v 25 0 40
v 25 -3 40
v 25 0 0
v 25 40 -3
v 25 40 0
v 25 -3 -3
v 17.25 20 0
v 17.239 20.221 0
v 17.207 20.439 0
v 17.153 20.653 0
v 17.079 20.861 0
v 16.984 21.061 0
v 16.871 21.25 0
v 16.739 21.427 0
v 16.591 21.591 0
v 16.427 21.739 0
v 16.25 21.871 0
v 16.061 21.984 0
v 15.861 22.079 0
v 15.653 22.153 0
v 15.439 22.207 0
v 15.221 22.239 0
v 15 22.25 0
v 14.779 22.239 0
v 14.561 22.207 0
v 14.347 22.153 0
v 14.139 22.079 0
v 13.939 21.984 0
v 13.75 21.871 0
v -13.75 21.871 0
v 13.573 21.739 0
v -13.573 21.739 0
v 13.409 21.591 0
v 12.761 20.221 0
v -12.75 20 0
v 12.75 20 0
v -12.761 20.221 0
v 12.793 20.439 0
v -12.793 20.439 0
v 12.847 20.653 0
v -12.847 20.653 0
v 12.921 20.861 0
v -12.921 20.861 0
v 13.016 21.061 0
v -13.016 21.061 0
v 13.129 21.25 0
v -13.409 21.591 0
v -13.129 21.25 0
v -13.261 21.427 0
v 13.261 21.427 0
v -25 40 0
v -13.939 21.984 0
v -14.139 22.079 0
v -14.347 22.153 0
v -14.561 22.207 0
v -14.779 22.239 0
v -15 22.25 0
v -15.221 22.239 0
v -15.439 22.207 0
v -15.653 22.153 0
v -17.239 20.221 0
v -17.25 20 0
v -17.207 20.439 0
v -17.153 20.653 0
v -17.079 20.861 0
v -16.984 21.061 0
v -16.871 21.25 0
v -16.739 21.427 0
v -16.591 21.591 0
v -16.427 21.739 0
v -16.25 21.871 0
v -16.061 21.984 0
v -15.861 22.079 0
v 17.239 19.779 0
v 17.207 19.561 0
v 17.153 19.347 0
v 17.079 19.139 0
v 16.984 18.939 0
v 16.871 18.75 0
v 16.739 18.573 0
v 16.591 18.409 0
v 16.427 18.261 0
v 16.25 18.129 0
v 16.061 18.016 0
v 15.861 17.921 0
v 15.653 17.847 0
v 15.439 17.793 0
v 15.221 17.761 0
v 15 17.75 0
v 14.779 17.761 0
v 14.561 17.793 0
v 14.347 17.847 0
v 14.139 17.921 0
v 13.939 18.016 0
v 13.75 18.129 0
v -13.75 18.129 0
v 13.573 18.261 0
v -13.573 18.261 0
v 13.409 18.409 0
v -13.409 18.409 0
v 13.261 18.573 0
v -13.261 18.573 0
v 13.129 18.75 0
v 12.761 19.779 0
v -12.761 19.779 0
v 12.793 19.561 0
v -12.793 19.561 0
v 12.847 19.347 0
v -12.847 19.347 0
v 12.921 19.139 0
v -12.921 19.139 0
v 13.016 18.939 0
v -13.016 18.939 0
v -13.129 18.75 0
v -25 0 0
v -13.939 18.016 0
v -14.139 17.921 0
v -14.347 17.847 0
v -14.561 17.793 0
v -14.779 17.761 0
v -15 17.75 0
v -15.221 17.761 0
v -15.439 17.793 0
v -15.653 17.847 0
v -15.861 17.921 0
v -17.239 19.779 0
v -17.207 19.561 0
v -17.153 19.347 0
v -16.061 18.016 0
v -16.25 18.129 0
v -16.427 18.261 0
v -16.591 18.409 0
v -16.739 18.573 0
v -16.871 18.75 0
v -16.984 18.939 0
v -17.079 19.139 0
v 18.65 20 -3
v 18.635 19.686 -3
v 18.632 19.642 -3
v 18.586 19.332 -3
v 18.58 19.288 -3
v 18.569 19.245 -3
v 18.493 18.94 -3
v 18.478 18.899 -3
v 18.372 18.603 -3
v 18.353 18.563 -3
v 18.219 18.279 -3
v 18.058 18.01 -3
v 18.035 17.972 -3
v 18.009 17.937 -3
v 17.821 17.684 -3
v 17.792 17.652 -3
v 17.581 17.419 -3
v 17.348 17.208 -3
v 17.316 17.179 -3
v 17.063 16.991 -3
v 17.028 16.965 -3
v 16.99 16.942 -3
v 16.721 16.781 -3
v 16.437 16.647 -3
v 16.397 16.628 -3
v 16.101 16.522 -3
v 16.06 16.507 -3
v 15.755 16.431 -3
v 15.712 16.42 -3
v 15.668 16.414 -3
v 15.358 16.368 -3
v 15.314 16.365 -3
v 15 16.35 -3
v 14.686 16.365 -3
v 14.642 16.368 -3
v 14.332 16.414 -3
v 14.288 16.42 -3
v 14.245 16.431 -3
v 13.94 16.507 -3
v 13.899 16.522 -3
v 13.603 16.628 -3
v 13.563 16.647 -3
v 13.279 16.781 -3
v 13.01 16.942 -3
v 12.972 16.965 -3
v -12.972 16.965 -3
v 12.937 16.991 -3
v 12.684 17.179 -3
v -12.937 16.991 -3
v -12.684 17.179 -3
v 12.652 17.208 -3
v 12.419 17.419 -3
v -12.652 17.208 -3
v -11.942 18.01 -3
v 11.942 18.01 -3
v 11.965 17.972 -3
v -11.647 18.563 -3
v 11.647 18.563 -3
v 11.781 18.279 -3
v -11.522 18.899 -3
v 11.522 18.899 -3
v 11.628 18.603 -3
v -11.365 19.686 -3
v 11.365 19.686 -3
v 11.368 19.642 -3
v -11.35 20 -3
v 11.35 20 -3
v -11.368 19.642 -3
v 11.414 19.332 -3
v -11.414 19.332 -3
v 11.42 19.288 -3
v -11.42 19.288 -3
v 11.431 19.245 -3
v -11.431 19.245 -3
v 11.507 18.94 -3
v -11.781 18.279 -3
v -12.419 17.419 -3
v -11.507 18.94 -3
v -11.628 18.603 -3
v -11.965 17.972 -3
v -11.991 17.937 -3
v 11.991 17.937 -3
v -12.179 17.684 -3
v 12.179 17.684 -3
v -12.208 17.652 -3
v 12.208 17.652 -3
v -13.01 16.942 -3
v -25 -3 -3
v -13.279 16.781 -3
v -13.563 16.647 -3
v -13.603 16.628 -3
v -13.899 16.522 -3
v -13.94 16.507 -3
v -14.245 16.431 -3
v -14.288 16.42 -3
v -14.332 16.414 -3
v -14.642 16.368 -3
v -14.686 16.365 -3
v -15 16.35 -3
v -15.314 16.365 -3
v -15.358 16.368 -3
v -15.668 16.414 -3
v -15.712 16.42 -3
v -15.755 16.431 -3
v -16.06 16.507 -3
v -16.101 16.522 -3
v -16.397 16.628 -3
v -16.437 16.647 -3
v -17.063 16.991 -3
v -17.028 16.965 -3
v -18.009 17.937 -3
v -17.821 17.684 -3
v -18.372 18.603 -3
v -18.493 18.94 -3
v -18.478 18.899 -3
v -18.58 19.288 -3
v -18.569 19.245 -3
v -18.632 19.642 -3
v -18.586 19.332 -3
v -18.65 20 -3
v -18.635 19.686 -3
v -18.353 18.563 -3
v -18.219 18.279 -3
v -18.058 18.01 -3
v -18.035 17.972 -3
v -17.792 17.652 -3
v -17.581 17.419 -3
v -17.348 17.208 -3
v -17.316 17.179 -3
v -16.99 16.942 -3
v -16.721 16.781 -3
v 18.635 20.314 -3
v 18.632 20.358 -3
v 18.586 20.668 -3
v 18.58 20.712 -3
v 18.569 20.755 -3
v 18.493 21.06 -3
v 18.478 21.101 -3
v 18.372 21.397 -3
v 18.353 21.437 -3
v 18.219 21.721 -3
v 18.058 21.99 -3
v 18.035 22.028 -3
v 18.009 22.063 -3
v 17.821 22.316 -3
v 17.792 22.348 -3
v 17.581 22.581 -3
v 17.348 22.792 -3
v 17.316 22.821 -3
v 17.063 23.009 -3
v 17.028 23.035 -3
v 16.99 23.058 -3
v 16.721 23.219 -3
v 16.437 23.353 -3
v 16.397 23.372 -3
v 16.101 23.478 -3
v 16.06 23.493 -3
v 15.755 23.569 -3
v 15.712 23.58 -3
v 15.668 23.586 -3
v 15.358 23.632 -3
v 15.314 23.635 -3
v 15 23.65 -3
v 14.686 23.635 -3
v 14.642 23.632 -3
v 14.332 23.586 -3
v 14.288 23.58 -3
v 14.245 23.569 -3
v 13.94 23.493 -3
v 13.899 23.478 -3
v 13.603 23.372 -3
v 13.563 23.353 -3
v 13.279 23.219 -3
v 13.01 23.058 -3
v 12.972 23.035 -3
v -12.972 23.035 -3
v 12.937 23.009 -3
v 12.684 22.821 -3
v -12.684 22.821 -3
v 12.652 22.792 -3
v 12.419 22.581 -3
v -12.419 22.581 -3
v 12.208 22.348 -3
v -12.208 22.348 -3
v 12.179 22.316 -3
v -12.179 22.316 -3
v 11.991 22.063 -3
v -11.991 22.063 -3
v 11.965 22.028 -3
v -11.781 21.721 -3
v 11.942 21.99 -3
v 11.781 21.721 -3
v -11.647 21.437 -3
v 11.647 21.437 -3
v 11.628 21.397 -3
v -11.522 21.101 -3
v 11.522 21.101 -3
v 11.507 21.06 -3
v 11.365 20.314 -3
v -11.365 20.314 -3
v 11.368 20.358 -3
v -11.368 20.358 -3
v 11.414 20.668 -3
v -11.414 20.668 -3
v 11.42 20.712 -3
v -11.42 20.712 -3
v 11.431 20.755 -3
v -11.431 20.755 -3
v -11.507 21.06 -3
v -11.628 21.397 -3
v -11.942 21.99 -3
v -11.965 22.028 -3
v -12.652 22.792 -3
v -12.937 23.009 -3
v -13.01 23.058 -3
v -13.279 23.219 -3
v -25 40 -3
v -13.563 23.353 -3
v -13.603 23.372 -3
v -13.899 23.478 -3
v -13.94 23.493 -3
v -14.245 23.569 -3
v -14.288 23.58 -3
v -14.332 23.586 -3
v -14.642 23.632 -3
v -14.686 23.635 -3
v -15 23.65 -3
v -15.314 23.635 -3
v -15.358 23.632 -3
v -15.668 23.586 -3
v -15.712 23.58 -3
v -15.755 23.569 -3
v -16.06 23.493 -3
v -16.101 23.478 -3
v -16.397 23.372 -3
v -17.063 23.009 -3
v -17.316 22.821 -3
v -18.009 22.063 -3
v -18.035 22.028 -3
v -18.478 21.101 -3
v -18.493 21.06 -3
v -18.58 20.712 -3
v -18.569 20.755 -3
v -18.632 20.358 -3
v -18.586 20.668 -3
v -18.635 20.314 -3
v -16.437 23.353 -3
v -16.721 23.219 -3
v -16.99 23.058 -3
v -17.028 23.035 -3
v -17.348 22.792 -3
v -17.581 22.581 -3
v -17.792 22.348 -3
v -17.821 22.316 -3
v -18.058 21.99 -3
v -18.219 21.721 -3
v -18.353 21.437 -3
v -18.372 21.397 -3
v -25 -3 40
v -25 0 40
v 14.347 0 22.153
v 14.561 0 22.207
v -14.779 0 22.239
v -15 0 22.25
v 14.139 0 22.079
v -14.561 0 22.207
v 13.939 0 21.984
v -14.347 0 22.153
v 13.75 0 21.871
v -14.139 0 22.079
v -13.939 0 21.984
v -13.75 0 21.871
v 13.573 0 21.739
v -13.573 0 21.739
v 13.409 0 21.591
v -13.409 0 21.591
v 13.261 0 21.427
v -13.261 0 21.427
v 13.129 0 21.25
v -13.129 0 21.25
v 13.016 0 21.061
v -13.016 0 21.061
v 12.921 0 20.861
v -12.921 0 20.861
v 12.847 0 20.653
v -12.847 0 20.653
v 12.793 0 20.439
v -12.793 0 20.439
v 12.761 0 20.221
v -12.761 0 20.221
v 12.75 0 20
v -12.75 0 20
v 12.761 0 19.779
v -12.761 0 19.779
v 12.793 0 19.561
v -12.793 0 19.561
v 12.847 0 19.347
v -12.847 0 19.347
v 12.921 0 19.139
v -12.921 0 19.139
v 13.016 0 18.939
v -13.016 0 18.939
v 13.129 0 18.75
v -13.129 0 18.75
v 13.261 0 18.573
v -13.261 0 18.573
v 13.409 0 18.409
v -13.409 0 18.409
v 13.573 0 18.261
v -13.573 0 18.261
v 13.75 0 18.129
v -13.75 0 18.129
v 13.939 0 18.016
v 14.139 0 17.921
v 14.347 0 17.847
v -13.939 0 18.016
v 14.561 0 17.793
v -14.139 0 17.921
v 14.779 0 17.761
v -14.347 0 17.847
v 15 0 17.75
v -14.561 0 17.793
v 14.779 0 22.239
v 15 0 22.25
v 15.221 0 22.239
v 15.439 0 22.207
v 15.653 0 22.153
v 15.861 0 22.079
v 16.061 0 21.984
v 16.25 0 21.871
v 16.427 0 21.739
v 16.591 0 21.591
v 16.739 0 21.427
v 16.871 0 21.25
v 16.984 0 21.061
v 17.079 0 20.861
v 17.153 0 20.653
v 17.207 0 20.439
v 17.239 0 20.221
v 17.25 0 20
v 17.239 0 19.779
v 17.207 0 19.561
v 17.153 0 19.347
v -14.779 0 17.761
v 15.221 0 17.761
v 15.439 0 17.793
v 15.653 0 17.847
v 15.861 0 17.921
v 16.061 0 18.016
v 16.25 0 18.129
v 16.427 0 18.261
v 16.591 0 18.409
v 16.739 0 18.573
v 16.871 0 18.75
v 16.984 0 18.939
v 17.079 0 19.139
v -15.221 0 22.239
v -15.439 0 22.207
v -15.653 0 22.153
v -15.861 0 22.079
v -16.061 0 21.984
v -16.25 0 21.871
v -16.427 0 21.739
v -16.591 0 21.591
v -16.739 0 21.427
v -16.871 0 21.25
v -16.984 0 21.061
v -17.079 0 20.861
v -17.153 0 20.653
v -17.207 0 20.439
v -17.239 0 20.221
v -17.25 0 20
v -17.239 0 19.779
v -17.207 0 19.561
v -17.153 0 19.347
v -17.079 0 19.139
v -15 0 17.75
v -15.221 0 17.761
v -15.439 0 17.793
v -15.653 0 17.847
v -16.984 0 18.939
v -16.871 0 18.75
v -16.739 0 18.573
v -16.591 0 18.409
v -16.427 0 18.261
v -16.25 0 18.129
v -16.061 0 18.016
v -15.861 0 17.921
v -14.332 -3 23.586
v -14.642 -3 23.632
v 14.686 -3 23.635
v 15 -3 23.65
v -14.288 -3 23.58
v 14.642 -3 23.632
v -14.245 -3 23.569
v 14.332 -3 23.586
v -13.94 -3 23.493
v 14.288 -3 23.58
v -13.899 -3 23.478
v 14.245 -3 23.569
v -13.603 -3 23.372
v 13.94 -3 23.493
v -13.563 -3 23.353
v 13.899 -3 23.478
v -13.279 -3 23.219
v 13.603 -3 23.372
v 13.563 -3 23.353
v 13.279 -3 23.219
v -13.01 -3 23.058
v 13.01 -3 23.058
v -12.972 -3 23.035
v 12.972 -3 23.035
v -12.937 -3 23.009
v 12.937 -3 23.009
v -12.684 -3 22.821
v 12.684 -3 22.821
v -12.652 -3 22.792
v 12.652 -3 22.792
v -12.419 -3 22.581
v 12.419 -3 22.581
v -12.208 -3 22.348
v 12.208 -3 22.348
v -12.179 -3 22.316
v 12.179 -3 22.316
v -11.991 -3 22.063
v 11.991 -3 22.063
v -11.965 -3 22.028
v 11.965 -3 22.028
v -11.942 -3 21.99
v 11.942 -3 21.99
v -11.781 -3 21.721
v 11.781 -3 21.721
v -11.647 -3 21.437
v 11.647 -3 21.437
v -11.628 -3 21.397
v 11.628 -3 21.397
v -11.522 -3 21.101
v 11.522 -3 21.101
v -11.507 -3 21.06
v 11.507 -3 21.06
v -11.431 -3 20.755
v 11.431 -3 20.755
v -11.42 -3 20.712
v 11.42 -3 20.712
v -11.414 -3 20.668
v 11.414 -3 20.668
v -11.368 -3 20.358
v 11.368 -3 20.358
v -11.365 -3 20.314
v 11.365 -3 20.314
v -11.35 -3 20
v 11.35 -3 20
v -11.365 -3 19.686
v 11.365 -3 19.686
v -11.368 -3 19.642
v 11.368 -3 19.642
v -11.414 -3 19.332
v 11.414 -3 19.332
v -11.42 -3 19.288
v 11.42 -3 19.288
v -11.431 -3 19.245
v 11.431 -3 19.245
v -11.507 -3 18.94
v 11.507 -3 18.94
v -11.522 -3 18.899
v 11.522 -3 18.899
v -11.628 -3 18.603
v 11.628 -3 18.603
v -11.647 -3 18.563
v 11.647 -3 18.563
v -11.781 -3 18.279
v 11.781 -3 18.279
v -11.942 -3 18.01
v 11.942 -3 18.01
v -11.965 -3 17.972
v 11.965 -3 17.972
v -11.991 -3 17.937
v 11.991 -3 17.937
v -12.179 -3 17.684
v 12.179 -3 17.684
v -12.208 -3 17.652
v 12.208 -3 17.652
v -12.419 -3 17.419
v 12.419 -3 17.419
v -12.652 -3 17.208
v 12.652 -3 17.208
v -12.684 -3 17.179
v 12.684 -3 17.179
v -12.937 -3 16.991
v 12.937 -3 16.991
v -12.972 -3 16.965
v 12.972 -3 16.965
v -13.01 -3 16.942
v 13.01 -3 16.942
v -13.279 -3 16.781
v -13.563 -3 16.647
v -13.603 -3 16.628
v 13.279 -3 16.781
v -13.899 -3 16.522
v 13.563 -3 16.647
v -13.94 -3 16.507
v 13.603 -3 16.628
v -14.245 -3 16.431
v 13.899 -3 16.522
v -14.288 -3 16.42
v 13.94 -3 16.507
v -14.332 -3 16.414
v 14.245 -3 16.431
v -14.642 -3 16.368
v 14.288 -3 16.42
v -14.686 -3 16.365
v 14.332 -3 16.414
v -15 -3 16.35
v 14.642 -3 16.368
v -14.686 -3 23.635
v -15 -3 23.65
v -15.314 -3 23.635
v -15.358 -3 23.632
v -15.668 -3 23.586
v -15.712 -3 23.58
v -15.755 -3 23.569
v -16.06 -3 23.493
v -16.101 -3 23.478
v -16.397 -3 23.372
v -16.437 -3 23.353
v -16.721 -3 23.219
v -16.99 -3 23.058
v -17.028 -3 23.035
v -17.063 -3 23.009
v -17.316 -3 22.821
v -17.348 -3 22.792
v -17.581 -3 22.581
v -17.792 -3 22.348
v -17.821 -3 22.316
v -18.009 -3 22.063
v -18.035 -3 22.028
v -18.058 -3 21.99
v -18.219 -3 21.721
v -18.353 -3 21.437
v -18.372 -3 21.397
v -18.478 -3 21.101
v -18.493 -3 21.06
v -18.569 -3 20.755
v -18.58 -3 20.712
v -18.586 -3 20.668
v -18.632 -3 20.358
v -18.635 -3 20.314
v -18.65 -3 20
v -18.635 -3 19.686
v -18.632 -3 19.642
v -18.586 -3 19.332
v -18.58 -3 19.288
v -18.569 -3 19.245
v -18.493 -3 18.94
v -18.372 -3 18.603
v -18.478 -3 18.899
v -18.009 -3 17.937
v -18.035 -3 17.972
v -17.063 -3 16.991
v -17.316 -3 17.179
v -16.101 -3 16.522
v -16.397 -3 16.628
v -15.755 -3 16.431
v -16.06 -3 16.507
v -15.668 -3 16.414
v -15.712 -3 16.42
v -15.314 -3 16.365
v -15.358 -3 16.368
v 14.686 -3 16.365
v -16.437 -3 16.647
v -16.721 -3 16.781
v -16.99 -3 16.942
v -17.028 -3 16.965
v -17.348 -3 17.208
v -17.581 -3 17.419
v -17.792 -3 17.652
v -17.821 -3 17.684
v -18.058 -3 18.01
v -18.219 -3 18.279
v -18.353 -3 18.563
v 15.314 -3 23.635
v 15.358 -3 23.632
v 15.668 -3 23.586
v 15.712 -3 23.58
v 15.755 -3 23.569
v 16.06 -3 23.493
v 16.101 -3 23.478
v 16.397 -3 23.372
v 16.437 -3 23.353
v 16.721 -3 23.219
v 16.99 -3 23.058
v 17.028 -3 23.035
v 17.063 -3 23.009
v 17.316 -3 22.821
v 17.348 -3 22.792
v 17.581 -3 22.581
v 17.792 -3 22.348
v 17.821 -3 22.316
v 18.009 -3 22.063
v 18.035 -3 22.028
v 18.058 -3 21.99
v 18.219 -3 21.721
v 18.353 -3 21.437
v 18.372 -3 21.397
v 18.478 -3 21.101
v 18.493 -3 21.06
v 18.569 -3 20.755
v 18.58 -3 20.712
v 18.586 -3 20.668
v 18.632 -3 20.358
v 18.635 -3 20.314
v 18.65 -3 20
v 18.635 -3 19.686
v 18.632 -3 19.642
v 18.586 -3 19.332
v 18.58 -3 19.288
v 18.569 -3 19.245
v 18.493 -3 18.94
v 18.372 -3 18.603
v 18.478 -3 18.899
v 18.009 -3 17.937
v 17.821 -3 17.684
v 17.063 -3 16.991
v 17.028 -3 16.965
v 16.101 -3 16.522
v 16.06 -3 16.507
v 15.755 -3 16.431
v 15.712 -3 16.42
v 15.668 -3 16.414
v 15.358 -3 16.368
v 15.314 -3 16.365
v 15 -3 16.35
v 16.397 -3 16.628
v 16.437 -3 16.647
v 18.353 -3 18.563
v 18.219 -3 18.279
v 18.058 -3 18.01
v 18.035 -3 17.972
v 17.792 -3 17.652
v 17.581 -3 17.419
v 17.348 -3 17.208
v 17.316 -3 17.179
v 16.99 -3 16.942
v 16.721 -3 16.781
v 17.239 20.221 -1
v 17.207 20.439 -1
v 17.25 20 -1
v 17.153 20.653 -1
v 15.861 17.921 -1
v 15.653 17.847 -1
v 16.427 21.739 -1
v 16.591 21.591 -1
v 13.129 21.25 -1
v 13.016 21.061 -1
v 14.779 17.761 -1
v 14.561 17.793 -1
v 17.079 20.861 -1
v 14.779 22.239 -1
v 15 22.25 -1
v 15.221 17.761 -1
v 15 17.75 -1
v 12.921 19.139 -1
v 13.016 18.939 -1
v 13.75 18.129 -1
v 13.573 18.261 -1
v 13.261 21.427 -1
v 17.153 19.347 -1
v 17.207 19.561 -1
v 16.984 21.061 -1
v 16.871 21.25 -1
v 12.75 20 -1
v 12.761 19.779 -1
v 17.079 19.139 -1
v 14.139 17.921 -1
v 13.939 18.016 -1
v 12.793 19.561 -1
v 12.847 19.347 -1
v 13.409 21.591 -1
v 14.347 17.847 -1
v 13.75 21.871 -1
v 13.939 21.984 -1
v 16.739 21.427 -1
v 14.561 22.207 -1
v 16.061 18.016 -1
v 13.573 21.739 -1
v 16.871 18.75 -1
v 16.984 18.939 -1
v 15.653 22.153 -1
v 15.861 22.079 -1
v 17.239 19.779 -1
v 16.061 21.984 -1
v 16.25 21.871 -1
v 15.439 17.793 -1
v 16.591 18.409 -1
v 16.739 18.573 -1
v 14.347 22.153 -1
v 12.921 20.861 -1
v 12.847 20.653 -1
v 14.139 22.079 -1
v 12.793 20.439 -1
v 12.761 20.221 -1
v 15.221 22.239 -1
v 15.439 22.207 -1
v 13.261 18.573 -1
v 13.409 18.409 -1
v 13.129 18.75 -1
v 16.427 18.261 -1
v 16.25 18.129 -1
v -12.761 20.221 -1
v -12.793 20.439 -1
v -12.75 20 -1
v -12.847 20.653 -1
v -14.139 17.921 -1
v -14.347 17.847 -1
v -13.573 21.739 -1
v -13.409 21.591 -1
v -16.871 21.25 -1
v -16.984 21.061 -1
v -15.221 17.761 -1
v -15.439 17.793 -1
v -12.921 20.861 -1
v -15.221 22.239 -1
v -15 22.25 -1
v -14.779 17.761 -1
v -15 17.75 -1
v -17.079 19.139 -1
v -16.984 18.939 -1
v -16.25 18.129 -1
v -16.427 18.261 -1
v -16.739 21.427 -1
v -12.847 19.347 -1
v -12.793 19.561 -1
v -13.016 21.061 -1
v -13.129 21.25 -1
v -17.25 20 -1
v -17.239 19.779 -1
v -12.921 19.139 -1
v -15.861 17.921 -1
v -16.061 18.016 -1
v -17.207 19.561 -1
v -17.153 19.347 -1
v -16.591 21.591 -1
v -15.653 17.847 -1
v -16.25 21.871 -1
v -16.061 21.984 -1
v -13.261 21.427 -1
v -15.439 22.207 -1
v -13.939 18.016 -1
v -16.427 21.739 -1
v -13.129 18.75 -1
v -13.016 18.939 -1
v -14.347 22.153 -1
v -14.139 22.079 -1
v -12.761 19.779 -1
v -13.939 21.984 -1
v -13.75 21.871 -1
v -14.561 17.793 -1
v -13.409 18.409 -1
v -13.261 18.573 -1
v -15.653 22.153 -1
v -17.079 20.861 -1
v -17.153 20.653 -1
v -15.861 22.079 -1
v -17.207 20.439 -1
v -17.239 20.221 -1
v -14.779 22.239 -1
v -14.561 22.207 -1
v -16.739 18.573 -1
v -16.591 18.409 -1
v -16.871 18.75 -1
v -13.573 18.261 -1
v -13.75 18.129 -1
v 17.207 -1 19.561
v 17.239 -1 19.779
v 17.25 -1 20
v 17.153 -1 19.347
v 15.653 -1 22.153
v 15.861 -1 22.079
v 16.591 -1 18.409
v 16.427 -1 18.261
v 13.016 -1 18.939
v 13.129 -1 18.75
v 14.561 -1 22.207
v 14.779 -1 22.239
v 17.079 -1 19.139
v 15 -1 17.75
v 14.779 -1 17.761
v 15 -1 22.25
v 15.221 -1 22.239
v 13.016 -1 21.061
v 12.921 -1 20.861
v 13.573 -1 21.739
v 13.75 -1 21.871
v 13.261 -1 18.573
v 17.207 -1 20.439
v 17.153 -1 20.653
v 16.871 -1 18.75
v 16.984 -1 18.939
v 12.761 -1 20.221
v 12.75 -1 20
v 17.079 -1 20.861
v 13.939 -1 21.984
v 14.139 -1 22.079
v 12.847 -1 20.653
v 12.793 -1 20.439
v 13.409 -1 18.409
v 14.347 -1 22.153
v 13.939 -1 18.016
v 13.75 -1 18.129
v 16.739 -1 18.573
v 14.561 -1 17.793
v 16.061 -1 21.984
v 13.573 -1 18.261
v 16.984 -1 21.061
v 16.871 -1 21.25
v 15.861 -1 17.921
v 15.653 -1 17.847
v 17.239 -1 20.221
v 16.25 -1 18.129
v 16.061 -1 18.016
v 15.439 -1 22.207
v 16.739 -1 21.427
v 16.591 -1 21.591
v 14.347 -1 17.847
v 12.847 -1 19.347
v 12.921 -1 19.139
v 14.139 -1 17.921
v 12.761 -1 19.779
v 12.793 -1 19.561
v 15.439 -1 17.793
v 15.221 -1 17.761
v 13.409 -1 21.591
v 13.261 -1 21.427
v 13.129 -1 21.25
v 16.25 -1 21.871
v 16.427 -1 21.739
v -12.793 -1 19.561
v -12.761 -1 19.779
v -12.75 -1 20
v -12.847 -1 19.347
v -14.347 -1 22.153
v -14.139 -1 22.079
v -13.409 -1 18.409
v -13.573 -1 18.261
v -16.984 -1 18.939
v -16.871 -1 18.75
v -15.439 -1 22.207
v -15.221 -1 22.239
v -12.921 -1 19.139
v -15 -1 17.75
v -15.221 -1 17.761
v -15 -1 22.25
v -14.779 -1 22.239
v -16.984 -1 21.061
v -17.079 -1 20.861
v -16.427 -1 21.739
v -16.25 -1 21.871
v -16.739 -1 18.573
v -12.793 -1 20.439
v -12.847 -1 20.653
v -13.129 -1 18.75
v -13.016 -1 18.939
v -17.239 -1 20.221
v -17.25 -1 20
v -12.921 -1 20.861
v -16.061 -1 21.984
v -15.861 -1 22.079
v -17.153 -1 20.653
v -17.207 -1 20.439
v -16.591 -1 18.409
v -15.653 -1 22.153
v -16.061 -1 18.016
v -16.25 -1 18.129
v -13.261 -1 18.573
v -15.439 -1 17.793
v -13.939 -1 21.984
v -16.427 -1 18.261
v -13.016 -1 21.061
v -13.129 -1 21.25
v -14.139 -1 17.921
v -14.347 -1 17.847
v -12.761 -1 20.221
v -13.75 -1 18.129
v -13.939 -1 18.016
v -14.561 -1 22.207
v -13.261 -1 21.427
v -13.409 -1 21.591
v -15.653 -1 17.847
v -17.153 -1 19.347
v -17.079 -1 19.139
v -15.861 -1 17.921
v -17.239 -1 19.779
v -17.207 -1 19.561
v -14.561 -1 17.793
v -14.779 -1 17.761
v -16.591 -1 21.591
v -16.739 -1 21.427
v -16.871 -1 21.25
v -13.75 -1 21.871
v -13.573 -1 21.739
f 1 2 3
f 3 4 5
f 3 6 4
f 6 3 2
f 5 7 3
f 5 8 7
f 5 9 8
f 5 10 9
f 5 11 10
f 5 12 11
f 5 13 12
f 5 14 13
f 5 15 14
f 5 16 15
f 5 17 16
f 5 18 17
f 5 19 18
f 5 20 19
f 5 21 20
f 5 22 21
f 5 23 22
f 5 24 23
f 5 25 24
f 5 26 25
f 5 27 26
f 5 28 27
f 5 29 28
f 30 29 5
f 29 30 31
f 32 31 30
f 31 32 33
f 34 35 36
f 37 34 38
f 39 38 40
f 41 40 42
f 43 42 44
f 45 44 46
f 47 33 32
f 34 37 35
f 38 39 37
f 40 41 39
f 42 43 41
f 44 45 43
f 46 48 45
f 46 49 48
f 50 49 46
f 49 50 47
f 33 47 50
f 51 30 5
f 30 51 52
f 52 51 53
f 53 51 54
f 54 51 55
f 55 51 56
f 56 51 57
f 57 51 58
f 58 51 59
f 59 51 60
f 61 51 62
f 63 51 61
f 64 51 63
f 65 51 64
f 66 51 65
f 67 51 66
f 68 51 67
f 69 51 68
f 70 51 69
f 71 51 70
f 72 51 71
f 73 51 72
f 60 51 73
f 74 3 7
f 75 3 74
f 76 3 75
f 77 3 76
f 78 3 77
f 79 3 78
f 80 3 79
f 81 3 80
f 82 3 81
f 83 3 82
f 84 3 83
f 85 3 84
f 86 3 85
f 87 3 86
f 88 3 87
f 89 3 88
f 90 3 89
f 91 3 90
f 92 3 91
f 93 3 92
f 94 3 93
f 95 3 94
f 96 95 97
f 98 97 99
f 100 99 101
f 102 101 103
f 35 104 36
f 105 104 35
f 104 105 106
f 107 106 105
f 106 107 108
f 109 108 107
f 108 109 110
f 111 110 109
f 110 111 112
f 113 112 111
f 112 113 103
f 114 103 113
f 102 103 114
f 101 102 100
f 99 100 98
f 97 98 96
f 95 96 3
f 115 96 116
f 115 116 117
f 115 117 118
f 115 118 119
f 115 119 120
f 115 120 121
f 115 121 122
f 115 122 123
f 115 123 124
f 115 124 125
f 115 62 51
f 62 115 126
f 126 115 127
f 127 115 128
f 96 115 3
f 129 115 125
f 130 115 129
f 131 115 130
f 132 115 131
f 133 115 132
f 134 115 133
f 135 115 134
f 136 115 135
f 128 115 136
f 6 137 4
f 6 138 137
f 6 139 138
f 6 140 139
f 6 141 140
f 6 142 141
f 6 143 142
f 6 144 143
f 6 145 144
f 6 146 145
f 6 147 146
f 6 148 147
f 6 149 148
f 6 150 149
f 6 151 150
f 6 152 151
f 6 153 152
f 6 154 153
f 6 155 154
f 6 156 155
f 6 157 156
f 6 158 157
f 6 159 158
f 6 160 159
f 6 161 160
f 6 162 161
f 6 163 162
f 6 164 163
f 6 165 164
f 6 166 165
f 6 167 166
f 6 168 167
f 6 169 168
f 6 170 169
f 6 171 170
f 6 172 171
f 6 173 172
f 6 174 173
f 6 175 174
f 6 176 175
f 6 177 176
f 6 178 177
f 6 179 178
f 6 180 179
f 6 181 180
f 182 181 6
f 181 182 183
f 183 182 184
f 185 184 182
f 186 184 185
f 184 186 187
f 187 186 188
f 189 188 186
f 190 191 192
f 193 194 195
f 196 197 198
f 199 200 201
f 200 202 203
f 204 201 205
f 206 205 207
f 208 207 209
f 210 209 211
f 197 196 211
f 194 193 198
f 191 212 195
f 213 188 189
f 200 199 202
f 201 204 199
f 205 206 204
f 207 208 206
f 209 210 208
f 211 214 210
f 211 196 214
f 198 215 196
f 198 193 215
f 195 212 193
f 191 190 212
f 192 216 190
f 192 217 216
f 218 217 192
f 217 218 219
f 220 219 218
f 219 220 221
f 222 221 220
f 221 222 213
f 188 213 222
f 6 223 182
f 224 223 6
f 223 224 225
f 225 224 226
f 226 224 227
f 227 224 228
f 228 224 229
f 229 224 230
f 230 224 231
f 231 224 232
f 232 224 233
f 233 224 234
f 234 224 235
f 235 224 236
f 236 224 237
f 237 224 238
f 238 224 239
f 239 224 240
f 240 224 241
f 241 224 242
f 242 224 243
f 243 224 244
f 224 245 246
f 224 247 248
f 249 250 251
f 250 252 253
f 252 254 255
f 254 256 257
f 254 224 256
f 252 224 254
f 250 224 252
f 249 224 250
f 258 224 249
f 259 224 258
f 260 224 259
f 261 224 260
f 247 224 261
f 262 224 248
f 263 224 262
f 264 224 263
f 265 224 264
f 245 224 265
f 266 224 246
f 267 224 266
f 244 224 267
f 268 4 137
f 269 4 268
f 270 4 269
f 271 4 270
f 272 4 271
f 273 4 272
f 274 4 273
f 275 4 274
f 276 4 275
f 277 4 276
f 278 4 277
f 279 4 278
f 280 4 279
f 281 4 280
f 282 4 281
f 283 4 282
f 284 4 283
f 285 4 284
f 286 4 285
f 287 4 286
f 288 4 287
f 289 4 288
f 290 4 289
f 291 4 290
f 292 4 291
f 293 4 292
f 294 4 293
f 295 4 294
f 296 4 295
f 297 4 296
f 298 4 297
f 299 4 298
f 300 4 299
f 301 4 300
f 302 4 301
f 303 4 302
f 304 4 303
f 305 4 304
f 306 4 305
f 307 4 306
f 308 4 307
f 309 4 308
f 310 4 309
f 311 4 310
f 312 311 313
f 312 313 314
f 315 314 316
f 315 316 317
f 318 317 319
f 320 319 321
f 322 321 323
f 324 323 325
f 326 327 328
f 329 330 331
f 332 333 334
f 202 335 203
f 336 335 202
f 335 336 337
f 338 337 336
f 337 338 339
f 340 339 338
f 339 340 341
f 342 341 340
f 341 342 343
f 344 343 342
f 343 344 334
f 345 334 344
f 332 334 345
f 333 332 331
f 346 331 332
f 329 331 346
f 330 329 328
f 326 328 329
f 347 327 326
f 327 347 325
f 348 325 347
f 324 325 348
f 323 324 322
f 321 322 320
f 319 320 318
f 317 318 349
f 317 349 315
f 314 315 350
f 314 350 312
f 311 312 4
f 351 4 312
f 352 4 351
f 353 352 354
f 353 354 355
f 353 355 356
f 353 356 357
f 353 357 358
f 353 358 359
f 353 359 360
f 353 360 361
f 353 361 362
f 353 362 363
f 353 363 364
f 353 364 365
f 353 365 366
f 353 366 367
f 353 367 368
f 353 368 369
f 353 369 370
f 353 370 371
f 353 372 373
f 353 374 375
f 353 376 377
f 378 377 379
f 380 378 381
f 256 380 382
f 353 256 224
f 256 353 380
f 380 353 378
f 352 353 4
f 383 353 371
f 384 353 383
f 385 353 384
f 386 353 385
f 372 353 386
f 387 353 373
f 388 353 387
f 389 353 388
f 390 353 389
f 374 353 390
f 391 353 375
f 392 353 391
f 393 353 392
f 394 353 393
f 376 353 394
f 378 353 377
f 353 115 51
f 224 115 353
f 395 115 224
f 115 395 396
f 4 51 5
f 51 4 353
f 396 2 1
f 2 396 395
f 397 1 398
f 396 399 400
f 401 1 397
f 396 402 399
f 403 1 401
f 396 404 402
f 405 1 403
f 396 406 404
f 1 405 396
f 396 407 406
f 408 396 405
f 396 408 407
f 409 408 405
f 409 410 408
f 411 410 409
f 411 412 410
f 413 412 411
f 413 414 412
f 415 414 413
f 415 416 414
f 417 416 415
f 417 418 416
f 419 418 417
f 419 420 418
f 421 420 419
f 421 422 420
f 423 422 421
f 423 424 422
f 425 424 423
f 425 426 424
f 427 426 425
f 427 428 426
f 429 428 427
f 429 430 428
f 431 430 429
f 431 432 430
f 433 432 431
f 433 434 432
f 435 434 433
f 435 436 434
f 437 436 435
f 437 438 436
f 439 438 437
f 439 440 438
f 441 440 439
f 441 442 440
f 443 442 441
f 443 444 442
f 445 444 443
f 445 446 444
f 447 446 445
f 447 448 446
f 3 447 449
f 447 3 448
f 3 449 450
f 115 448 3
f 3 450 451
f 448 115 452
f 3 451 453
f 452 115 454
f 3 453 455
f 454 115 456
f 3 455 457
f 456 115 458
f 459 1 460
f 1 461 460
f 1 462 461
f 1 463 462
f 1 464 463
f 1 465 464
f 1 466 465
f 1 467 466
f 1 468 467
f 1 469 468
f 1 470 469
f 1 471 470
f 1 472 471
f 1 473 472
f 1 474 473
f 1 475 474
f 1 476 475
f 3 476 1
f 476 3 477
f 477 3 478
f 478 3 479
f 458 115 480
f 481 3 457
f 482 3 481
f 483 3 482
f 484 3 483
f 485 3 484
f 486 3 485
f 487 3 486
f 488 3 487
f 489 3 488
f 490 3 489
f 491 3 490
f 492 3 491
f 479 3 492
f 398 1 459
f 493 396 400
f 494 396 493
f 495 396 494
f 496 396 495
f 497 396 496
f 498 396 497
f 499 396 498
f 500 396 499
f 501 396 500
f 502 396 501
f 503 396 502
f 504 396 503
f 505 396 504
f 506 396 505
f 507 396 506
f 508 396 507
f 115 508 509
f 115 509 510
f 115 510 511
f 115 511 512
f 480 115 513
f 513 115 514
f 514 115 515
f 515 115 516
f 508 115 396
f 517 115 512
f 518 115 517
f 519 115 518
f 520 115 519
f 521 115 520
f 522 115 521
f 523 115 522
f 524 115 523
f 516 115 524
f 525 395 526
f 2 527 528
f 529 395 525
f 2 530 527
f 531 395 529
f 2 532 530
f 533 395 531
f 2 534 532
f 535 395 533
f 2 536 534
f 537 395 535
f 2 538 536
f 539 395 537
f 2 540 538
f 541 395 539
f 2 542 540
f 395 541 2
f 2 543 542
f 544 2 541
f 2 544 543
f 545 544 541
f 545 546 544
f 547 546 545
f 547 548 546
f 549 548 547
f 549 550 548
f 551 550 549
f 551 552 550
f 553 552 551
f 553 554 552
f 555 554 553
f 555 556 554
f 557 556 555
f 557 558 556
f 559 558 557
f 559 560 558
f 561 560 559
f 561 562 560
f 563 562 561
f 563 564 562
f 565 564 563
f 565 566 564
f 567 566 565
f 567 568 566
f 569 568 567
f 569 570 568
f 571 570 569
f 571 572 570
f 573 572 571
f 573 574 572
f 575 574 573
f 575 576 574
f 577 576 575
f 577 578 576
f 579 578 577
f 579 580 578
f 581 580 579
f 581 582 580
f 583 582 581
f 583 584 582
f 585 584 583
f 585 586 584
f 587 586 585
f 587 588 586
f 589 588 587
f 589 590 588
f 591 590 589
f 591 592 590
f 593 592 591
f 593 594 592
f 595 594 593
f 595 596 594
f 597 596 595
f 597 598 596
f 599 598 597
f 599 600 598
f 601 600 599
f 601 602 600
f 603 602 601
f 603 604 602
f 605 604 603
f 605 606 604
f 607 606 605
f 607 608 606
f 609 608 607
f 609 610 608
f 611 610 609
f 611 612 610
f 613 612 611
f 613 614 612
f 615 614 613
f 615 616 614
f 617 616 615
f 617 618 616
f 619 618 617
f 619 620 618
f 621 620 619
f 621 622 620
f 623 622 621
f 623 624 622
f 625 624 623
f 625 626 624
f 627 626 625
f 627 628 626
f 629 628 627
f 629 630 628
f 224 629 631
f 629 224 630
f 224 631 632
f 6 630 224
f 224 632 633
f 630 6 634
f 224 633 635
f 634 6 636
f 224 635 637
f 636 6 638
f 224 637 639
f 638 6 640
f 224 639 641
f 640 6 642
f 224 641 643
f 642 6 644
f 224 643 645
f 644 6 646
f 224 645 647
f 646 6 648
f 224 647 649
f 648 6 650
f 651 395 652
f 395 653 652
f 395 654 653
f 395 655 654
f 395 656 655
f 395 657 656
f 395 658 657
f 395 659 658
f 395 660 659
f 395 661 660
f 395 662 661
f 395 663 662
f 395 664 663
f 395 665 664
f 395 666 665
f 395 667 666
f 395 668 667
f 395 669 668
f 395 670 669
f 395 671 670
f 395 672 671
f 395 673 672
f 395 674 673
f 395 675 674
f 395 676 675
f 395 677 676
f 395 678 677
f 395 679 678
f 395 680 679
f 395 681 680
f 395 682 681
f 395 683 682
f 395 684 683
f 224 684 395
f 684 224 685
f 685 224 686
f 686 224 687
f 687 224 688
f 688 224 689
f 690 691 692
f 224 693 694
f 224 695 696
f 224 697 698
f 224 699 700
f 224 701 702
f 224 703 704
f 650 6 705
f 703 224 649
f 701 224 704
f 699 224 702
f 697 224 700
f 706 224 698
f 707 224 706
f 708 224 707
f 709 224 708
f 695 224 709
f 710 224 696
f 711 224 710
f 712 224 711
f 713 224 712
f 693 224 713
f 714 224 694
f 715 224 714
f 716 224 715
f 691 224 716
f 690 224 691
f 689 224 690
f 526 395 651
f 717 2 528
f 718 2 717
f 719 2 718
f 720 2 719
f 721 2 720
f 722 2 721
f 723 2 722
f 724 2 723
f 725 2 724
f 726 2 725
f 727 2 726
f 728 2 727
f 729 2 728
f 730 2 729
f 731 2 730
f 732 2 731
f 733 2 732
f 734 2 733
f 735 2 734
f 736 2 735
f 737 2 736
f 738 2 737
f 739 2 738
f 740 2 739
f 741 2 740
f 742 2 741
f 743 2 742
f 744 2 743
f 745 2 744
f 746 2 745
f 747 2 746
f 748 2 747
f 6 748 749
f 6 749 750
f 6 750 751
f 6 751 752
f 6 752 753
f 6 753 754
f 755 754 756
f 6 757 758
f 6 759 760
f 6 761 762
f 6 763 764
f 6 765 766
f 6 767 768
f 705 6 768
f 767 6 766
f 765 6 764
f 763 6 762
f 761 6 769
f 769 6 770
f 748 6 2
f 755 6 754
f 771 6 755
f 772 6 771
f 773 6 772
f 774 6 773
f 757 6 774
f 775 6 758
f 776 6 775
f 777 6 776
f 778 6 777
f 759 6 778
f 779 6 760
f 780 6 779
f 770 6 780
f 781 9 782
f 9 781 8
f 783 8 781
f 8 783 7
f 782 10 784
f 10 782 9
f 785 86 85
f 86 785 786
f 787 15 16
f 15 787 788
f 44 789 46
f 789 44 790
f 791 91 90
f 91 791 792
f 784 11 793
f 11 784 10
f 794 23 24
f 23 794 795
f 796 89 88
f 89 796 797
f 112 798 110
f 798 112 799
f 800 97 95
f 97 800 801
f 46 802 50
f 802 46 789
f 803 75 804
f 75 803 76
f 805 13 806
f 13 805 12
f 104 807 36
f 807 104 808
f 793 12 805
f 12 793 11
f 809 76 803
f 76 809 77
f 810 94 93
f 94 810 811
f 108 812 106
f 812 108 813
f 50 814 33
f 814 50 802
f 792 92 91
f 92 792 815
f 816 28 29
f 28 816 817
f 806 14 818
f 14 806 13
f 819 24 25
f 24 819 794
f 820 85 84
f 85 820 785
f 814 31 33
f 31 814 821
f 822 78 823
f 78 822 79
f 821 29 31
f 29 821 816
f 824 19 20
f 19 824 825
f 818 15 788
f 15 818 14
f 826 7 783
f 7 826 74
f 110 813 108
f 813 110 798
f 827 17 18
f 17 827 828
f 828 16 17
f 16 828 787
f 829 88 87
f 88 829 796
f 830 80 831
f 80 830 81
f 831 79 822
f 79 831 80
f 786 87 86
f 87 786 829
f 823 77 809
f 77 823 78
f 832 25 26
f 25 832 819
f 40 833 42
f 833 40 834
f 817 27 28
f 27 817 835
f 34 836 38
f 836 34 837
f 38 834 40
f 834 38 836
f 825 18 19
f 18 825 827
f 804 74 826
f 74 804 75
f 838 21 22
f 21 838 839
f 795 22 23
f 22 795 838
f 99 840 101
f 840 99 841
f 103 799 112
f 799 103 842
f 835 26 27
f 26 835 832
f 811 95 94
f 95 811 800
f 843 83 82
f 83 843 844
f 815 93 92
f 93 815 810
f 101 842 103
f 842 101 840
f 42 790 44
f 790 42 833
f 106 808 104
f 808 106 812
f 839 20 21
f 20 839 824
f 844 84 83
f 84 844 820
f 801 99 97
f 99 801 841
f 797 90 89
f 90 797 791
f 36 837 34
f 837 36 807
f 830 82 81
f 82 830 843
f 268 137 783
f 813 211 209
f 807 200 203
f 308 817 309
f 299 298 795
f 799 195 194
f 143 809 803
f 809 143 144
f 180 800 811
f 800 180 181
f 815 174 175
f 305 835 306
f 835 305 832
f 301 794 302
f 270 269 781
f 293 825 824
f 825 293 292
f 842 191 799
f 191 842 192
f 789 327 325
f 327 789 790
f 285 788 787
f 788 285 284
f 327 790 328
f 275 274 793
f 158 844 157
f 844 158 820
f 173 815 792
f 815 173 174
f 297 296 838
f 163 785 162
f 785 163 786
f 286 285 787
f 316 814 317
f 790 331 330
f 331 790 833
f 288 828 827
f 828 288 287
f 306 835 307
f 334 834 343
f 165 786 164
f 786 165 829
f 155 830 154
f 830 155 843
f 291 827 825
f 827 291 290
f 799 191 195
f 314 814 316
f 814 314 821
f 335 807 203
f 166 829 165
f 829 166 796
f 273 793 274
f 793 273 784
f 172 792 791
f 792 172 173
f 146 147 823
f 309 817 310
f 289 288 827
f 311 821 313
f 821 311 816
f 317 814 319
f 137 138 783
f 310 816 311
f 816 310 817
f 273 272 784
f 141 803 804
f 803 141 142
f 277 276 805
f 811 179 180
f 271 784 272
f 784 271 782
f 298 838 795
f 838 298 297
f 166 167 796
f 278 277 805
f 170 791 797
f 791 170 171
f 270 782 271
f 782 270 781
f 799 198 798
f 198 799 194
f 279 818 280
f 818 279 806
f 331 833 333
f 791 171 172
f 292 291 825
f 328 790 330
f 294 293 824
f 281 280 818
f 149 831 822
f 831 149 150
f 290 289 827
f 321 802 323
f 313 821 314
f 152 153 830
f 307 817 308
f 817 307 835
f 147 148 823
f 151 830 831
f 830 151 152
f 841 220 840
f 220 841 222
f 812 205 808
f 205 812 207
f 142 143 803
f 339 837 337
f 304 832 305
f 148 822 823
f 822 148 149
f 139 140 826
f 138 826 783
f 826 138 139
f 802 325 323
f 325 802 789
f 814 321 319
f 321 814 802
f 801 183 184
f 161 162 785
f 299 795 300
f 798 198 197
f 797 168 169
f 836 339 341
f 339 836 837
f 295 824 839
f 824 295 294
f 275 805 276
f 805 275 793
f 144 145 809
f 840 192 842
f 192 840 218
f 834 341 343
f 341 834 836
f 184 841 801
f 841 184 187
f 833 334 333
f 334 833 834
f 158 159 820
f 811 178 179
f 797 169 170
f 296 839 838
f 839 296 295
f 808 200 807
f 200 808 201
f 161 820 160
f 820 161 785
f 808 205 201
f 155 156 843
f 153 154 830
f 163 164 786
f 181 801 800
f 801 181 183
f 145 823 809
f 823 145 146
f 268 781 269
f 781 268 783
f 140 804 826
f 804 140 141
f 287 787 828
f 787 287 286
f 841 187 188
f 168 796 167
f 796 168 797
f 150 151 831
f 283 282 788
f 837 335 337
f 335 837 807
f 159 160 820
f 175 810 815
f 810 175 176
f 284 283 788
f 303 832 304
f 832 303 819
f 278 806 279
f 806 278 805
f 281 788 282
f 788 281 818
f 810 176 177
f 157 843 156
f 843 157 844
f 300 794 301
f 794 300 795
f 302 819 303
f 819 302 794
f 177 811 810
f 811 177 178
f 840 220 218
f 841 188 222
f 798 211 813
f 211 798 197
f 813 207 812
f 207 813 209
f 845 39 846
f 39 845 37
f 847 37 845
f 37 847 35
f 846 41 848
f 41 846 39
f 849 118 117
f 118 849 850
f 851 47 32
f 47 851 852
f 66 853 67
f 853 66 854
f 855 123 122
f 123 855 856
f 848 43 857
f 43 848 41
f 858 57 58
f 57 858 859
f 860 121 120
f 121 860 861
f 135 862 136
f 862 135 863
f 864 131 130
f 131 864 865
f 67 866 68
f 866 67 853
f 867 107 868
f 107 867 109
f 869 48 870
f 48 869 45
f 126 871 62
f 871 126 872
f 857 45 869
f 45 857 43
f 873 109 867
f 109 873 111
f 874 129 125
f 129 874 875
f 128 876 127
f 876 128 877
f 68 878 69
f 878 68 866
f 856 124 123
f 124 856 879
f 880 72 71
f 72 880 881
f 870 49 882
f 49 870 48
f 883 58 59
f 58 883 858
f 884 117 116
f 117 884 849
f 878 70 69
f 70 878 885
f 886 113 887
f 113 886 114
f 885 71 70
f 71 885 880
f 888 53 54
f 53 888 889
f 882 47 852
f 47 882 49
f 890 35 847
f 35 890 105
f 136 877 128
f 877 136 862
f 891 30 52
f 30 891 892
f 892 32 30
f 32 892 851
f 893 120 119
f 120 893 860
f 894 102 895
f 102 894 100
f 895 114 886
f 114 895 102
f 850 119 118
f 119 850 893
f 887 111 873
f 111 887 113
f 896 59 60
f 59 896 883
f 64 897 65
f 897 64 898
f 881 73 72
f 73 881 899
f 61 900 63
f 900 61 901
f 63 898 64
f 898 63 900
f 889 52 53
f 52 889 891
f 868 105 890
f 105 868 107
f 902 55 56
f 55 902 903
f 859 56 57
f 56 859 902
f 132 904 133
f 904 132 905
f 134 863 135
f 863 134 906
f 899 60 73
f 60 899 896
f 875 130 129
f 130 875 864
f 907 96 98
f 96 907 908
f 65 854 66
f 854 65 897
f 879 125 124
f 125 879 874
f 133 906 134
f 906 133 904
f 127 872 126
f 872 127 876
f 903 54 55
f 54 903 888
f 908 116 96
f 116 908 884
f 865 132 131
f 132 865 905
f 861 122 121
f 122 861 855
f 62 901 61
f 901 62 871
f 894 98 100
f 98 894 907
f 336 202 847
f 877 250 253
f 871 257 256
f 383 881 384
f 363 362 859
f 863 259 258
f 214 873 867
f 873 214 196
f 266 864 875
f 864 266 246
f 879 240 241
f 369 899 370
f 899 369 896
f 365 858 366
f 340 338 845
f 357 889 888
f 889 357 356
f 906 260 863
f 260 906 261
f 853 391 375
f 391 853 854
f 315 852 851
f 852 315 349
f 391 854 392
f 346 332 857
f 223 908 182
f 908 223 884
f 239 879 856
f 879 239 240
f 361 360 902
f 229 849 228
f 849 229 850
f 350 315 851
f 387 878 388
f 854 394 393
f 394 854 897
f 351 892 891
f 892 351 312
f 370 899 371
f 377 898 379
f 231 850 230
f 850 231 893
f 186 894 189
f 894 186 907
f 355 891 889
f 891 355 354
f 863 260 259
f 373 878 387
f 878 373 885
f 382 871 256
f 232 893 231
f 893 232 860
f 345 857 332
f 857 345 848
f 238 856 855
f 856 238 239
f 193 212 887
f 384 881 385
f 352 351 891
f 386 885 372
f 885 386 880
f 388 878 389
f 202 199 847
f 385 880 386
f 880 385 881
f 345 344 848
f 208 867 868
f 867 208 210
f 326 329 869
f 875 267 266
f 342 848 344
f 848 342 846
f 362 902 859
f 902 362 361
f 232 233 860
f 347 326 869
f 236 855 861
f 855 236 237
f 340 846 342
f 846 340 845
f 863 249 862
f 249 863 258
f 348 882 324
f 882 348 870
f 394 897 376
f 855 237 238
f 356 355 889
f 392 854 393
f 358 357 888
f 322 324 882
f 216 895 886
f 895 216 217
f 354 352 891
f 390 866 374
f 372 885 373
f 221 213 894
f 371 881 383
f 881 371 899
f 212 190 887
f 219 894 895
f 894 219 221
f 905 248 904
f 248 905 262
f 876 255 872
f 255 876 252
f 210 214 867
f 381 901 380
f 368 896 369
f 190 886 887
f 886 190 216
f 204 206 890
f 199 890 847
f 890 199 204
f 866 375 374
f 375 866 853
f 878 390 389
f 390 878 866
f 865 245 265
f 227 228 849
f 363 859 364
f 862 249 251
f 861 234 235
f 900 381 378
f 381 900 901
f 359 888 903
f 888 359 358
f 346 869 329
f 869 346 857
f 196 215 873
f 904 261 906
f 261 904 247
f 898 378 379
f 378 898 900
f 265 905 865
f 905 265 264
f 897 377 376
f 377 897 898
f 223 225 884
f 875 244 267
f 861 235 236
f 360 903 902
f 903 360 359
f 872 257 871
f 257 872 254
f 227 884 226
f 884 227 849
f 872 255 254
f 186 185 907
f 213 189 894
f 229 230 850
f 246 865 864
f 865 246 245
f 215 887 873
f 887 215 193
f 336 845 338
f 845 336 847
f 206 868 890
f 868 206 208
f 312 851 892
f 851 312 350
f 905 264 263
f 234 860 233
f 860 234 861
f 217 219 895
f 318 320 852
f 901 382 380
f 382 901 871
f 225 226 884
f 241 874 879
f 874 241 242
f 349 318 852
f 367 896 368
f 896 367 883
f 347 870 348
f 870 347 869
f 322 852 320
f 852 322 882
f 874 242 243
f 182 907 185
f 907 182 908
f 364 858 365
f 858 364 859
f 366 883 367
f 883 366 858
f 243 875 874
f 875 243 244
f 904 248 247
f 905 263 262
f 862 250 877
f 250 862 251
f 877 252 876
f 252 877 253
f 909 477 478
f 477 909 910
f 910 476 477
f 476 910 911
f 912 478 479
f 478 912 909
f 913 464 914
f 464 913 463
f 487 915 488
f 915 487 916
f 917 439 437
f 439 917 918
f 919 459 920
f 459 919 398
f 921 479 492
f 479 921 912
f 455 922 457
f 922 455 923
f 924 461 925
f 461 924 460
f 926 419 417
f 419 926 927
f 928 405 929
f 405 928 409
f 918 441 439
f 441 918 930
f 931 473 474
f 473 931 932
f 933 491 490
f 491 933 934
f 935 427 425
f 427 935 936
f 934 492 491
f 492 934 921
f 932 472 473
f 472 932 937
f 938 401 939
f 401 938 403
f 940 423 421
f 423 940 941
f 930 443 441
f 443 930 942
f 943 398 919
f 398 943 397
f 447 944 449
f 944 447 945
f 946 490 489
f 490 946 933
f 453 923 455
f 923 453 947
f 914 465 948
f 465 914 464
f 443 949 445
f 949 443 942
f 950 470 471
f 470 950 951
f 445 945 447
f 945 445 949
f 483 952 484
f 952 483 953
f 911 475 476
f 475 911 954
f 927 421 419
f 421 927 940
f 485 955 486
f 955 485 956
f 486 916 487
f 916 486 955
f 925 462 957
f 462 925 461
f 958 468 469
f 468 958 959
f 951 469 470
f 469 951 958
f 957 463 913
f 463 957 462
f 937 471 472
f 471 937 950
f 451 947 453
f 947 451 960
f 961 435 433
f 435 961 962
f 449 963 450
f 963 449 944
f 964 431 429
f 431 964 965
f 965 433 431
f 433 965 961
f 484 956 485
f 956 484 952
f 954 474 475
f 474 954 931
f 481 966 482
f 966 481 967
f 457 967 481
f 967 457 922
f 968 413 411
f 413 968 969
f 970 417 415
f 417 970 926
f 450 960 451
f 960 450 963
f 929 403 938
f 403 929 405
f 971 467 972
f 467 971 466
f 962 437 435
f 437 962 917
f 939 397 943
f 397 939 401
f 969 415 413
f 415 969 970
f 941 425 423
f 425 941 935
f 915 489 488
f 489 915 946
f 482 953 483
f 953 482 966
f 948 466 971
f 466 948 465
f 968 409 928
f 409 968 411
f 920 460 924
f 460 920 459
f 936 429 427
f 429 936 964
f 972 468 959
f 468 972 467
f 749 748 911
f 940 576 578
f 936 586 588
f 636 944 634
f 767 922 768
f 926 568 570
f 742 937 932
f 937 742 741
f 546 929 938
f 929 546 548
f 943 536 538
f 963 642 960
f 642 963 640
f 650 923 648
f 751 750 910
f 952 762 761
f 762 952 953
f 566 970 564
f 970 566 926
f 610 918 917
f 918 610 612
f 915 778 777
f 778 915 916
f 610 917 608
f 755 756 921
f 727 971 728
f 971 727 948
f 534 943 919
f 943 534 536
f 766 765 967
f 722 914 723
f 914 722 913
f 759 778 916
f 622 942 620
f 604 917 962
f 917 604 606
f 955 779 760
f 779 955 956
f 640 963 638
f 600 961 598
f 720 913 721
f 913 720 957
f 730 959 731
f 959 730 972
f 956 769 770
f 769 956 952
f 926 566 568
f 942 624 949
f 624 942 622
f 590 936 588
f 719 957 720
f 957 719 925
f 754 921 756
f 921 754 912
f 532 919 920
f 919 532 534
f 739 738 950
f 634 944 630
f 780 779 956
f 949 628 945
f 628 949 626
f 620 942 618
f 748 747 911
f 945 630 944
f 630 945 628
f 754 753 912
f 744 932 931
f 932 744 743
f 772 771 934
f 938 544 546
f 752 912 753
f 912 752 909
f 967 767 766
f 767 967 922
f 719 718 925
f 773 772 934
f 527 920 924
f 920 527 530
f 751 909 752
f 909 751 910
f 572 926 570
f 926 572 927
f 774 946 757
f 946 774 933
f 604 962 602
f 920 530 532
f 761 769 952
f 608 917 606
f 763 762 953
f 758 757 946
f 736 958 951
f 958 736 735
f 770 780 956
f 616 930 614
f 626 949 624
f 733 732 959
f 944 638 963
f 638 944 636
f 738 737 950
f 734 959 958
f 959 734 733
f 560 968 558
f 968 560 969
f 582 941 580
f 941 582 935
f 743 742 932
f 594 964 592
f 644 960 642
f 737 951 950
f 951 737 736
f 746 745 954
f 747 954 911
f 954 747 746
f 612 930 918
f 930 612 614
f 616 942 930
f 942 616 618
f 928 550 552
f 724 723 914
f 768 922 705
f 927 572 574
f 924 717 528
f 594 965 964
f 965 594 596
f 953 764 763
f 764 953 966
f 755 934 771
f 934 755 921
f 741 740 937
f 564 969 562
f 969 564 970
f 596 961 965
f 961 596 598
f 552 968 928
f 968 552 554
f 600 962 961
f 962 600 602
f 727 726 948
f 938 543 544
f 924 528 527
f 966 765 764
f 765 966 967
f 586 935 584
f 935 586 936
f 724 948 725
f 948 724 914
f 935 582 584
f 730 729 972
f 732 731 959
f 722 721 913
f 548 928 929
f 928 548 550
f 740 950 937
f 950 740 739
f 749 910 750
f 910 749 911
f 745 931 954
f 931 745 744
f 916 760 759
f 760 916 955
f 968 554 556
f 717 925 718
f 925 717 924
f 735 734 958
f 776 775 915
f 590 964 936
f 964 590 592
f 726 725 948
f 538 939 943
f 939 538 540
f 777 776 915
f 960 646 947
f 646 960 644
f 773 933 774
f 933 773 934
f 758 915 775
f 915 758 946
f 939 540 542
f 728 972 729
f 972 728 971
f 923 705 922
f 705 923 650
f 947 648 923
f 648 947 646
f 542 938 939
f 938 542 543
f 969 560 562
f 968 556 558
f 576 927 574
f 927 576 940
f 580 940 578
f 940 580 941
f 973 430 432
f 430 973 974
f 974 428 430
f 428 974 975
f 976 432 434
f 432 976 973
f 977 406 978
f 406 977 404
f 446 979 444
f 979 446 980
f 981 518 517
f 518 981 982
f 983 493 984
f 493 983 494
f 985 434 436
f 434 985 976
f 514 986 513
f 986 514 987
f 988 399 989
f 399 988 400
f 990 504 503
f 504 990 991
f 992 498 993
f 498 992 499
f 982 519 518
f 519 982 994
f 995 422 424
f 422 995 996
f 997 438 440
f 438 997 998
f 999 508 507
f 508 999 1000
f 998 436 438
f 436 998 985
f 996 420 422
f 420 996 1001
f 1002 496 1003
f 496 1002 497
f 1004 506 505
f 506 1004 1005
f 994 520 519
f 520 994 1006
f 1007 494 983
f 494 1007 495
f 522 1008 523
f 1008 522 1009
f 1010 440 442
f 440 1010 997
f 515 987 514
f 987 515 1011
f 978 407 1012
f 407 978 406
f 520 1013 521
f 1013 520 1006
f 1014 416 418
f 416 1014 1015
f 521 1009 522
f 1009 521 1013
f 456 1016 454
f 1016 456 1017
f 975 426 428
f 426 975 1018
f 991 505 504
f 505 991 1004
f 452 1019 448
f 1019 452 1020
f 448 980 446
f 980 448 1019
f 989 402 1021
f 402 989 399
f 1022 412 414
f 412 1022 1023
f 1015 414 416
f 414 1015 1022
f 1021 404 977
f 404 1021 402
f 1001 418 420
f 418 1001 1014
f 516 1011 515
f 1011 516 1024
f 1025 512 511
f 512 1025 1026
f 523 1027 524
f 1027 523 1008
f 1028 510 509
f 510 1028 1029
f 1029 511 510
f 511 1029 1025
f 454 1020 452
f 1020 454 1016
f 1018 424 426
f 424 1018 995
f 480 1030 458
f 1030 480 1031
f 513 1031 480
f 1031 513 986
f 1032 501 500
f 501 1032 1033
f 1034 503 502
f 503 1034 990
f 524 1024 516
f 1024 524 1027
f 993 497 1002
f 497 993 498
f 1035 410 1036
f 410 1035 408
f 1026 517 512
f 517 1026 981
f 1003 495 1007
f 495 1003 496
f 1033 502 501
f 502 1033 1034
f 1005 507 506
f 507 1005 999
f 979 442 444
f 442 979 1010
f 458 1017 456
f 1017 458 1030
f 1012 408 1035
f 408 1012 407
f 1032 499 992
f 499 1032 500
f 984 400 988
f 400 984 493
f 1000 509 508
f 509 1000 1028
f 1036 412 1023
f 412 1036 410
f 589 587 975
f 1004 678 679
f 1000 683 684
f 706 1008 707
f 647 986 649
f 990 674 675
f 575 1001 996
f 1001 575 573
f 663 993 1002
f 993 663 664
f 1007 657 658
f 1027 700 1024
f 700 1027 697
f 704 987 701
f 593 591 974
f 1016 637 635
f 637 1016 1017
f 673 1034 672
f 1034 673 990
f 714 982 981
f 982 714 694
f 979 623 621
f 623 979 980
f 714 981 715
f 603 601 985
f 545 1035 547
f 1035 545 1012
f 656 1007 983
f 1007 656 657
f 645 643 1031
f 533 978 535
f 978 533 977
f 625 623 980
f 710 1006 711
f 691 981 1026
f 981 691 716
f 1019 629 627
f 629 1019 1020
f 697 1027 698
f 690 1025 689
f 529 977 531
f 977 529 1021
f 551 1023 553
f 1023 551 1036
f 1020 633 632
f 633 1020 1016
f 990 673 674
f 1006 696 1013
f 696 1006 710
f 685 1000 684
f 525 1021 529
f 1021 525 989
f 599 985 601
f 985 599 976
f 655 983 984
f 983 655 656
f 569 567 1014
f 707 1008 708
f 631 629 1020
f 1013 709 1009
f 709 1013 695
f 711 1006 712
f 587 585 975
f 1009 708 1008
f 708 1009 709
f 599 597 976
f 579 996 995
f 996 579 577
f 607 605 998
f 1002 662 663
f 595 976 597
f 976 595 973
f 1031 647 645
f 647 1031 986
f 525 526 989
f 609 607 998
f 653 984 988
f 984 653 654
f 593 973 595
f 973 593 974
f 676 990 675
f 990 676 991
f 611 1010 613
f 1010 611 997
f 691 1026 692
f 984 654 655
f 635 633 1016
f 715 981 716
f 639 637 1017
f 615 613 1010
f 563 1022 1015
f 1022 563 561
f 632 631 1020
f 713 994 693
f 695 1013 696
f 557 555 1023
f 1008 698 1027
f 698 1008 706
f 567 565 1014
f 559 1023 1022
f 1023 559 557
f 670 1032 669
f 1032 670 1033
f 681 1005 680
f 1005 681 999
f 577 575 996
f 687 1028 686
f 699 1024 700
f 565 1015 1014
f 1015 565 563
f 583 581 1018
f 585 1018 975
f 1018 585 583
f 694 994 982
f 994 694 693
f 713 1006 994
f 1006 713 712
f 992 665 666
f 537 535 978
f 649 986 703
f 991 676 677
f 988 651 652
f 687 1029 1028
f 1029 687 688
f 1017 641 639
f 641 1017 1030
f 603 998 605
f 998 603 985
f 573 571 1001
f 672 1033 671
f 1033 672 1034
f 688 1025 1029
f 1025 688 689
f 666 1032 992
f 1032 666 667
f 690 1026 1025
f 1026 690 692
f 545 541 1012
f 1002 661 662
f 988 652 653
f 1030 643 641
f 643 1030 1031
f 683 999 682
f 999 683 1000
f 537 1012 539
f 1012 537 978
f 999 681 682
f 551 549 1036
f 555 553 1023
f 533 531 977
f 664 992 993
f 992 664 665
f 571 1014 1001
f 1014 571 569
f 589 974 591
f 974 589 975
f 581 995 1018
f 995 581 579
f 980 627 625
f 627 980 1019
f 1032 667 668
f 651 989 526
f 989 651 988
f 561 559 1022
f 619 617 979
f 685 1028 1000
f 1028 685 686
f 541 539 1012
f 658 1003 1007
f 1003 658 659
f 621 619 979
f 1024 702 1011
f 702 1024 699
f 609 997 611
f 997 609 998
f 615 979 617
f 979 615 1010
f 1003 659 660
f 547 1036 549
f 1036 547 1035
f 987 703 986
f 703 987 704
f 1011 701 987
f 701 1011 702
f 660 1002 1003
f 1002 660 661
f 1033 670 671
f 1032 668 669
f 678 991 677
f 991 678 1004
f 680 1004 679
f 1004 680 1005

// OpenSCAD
// =========================================
// L字金具 (L-bracket) with countersunk holes
// =========================================

width      = 50;   // X方向:幅
depth      = 40;   // Y方向:水平面の奥行き
height     = 40;   // Z方向:垂直面の高さ
thick      = 3;    // 板厚

hole_d     = 4.5;  // 貫通穴径 (M4用)
csk_d      = 8;    // 皿座面径
csk_depth  = 2;    // 皿座面深さ
edge_off   = 10;   // 縁からの穴中心オフセット

hole_x = width/2 - edge_off;  // = 15
eps    = 0.5;                 // ブーリアン演算用の余裕

$fn = 64;

// ---------- 本体形状 ----------
module bracket_body(){
    union(){
        // 水平面: 内側面 Z=0 (原点), 外側面 Z=-thick
        translate([-width/2, 0, -thick])
            cube([width, depth, thick]);

        // 垂直面: 内側面 Y=0 (原点), 外側面 Y=-thick
        translate([-width/2, -thick, 0])
            cube([width, thick, height]);

        // 内側コーナーを埋める補強ブロック(折り曲げ部の連続性確保)
        translate([-width/2, -thick, -thick])
            cube([width, thick, thick]);
    }
}

// ---------- 水平面用 皿穴(Z方向に貫通、外側=下面に皿座面) ----------
module h_hole(x, y){
    translate([x, y, 0]){
        // 貫通穴
        translate([0, 0, -thick - eps])
            cylinder(h = thick + 2*eps, d = hole_d);

        // 皿座面(外側 Z=-thick 側が広い)
        translate([0, 0, -thick - eps])
            cylinder(h = csk_depth + eps, r1 = csk_d/2, r2 = hole_d/2);
    }
}

// ---------- 垂直面用 皿穴(Y方向に貫通、外側=背面に皿座面) ----------
module v_hole(x, z){
    translate([x, 0, z])
        rotate([-90, 0, 0]){
            // 貫通穴
            translate([0, 0, -thick - eps])
                cylinder(h = thick + 2*eps, d = hole_d);

            // 皿座面(外側 Y=-thick 側が広い)
            translate([0, 0, -thick - eps])
                cylinder(h = csk_depth + eps, r1 = csk_d/2, r2 = hole_d/2);
        }
}

// ---------- 全ての穴 ----------
module all_holes(){
    // 水平面: 中心線 Y = depth/2, 左右対称にX方向へオフセット
    h_hole( hole_x, depth/2);
    h_hole(-hole_x, depth/2);

    // 垂直面: 中心線 Z = height/2, 左右対称にX方向へオフセット
    v_hole( hole_x, height/2);
    v_hole(-hole_x, height/2);
}

// ---------- 最終形状 ----------
difference(){
    bracket_body();
    all_holes();
}
